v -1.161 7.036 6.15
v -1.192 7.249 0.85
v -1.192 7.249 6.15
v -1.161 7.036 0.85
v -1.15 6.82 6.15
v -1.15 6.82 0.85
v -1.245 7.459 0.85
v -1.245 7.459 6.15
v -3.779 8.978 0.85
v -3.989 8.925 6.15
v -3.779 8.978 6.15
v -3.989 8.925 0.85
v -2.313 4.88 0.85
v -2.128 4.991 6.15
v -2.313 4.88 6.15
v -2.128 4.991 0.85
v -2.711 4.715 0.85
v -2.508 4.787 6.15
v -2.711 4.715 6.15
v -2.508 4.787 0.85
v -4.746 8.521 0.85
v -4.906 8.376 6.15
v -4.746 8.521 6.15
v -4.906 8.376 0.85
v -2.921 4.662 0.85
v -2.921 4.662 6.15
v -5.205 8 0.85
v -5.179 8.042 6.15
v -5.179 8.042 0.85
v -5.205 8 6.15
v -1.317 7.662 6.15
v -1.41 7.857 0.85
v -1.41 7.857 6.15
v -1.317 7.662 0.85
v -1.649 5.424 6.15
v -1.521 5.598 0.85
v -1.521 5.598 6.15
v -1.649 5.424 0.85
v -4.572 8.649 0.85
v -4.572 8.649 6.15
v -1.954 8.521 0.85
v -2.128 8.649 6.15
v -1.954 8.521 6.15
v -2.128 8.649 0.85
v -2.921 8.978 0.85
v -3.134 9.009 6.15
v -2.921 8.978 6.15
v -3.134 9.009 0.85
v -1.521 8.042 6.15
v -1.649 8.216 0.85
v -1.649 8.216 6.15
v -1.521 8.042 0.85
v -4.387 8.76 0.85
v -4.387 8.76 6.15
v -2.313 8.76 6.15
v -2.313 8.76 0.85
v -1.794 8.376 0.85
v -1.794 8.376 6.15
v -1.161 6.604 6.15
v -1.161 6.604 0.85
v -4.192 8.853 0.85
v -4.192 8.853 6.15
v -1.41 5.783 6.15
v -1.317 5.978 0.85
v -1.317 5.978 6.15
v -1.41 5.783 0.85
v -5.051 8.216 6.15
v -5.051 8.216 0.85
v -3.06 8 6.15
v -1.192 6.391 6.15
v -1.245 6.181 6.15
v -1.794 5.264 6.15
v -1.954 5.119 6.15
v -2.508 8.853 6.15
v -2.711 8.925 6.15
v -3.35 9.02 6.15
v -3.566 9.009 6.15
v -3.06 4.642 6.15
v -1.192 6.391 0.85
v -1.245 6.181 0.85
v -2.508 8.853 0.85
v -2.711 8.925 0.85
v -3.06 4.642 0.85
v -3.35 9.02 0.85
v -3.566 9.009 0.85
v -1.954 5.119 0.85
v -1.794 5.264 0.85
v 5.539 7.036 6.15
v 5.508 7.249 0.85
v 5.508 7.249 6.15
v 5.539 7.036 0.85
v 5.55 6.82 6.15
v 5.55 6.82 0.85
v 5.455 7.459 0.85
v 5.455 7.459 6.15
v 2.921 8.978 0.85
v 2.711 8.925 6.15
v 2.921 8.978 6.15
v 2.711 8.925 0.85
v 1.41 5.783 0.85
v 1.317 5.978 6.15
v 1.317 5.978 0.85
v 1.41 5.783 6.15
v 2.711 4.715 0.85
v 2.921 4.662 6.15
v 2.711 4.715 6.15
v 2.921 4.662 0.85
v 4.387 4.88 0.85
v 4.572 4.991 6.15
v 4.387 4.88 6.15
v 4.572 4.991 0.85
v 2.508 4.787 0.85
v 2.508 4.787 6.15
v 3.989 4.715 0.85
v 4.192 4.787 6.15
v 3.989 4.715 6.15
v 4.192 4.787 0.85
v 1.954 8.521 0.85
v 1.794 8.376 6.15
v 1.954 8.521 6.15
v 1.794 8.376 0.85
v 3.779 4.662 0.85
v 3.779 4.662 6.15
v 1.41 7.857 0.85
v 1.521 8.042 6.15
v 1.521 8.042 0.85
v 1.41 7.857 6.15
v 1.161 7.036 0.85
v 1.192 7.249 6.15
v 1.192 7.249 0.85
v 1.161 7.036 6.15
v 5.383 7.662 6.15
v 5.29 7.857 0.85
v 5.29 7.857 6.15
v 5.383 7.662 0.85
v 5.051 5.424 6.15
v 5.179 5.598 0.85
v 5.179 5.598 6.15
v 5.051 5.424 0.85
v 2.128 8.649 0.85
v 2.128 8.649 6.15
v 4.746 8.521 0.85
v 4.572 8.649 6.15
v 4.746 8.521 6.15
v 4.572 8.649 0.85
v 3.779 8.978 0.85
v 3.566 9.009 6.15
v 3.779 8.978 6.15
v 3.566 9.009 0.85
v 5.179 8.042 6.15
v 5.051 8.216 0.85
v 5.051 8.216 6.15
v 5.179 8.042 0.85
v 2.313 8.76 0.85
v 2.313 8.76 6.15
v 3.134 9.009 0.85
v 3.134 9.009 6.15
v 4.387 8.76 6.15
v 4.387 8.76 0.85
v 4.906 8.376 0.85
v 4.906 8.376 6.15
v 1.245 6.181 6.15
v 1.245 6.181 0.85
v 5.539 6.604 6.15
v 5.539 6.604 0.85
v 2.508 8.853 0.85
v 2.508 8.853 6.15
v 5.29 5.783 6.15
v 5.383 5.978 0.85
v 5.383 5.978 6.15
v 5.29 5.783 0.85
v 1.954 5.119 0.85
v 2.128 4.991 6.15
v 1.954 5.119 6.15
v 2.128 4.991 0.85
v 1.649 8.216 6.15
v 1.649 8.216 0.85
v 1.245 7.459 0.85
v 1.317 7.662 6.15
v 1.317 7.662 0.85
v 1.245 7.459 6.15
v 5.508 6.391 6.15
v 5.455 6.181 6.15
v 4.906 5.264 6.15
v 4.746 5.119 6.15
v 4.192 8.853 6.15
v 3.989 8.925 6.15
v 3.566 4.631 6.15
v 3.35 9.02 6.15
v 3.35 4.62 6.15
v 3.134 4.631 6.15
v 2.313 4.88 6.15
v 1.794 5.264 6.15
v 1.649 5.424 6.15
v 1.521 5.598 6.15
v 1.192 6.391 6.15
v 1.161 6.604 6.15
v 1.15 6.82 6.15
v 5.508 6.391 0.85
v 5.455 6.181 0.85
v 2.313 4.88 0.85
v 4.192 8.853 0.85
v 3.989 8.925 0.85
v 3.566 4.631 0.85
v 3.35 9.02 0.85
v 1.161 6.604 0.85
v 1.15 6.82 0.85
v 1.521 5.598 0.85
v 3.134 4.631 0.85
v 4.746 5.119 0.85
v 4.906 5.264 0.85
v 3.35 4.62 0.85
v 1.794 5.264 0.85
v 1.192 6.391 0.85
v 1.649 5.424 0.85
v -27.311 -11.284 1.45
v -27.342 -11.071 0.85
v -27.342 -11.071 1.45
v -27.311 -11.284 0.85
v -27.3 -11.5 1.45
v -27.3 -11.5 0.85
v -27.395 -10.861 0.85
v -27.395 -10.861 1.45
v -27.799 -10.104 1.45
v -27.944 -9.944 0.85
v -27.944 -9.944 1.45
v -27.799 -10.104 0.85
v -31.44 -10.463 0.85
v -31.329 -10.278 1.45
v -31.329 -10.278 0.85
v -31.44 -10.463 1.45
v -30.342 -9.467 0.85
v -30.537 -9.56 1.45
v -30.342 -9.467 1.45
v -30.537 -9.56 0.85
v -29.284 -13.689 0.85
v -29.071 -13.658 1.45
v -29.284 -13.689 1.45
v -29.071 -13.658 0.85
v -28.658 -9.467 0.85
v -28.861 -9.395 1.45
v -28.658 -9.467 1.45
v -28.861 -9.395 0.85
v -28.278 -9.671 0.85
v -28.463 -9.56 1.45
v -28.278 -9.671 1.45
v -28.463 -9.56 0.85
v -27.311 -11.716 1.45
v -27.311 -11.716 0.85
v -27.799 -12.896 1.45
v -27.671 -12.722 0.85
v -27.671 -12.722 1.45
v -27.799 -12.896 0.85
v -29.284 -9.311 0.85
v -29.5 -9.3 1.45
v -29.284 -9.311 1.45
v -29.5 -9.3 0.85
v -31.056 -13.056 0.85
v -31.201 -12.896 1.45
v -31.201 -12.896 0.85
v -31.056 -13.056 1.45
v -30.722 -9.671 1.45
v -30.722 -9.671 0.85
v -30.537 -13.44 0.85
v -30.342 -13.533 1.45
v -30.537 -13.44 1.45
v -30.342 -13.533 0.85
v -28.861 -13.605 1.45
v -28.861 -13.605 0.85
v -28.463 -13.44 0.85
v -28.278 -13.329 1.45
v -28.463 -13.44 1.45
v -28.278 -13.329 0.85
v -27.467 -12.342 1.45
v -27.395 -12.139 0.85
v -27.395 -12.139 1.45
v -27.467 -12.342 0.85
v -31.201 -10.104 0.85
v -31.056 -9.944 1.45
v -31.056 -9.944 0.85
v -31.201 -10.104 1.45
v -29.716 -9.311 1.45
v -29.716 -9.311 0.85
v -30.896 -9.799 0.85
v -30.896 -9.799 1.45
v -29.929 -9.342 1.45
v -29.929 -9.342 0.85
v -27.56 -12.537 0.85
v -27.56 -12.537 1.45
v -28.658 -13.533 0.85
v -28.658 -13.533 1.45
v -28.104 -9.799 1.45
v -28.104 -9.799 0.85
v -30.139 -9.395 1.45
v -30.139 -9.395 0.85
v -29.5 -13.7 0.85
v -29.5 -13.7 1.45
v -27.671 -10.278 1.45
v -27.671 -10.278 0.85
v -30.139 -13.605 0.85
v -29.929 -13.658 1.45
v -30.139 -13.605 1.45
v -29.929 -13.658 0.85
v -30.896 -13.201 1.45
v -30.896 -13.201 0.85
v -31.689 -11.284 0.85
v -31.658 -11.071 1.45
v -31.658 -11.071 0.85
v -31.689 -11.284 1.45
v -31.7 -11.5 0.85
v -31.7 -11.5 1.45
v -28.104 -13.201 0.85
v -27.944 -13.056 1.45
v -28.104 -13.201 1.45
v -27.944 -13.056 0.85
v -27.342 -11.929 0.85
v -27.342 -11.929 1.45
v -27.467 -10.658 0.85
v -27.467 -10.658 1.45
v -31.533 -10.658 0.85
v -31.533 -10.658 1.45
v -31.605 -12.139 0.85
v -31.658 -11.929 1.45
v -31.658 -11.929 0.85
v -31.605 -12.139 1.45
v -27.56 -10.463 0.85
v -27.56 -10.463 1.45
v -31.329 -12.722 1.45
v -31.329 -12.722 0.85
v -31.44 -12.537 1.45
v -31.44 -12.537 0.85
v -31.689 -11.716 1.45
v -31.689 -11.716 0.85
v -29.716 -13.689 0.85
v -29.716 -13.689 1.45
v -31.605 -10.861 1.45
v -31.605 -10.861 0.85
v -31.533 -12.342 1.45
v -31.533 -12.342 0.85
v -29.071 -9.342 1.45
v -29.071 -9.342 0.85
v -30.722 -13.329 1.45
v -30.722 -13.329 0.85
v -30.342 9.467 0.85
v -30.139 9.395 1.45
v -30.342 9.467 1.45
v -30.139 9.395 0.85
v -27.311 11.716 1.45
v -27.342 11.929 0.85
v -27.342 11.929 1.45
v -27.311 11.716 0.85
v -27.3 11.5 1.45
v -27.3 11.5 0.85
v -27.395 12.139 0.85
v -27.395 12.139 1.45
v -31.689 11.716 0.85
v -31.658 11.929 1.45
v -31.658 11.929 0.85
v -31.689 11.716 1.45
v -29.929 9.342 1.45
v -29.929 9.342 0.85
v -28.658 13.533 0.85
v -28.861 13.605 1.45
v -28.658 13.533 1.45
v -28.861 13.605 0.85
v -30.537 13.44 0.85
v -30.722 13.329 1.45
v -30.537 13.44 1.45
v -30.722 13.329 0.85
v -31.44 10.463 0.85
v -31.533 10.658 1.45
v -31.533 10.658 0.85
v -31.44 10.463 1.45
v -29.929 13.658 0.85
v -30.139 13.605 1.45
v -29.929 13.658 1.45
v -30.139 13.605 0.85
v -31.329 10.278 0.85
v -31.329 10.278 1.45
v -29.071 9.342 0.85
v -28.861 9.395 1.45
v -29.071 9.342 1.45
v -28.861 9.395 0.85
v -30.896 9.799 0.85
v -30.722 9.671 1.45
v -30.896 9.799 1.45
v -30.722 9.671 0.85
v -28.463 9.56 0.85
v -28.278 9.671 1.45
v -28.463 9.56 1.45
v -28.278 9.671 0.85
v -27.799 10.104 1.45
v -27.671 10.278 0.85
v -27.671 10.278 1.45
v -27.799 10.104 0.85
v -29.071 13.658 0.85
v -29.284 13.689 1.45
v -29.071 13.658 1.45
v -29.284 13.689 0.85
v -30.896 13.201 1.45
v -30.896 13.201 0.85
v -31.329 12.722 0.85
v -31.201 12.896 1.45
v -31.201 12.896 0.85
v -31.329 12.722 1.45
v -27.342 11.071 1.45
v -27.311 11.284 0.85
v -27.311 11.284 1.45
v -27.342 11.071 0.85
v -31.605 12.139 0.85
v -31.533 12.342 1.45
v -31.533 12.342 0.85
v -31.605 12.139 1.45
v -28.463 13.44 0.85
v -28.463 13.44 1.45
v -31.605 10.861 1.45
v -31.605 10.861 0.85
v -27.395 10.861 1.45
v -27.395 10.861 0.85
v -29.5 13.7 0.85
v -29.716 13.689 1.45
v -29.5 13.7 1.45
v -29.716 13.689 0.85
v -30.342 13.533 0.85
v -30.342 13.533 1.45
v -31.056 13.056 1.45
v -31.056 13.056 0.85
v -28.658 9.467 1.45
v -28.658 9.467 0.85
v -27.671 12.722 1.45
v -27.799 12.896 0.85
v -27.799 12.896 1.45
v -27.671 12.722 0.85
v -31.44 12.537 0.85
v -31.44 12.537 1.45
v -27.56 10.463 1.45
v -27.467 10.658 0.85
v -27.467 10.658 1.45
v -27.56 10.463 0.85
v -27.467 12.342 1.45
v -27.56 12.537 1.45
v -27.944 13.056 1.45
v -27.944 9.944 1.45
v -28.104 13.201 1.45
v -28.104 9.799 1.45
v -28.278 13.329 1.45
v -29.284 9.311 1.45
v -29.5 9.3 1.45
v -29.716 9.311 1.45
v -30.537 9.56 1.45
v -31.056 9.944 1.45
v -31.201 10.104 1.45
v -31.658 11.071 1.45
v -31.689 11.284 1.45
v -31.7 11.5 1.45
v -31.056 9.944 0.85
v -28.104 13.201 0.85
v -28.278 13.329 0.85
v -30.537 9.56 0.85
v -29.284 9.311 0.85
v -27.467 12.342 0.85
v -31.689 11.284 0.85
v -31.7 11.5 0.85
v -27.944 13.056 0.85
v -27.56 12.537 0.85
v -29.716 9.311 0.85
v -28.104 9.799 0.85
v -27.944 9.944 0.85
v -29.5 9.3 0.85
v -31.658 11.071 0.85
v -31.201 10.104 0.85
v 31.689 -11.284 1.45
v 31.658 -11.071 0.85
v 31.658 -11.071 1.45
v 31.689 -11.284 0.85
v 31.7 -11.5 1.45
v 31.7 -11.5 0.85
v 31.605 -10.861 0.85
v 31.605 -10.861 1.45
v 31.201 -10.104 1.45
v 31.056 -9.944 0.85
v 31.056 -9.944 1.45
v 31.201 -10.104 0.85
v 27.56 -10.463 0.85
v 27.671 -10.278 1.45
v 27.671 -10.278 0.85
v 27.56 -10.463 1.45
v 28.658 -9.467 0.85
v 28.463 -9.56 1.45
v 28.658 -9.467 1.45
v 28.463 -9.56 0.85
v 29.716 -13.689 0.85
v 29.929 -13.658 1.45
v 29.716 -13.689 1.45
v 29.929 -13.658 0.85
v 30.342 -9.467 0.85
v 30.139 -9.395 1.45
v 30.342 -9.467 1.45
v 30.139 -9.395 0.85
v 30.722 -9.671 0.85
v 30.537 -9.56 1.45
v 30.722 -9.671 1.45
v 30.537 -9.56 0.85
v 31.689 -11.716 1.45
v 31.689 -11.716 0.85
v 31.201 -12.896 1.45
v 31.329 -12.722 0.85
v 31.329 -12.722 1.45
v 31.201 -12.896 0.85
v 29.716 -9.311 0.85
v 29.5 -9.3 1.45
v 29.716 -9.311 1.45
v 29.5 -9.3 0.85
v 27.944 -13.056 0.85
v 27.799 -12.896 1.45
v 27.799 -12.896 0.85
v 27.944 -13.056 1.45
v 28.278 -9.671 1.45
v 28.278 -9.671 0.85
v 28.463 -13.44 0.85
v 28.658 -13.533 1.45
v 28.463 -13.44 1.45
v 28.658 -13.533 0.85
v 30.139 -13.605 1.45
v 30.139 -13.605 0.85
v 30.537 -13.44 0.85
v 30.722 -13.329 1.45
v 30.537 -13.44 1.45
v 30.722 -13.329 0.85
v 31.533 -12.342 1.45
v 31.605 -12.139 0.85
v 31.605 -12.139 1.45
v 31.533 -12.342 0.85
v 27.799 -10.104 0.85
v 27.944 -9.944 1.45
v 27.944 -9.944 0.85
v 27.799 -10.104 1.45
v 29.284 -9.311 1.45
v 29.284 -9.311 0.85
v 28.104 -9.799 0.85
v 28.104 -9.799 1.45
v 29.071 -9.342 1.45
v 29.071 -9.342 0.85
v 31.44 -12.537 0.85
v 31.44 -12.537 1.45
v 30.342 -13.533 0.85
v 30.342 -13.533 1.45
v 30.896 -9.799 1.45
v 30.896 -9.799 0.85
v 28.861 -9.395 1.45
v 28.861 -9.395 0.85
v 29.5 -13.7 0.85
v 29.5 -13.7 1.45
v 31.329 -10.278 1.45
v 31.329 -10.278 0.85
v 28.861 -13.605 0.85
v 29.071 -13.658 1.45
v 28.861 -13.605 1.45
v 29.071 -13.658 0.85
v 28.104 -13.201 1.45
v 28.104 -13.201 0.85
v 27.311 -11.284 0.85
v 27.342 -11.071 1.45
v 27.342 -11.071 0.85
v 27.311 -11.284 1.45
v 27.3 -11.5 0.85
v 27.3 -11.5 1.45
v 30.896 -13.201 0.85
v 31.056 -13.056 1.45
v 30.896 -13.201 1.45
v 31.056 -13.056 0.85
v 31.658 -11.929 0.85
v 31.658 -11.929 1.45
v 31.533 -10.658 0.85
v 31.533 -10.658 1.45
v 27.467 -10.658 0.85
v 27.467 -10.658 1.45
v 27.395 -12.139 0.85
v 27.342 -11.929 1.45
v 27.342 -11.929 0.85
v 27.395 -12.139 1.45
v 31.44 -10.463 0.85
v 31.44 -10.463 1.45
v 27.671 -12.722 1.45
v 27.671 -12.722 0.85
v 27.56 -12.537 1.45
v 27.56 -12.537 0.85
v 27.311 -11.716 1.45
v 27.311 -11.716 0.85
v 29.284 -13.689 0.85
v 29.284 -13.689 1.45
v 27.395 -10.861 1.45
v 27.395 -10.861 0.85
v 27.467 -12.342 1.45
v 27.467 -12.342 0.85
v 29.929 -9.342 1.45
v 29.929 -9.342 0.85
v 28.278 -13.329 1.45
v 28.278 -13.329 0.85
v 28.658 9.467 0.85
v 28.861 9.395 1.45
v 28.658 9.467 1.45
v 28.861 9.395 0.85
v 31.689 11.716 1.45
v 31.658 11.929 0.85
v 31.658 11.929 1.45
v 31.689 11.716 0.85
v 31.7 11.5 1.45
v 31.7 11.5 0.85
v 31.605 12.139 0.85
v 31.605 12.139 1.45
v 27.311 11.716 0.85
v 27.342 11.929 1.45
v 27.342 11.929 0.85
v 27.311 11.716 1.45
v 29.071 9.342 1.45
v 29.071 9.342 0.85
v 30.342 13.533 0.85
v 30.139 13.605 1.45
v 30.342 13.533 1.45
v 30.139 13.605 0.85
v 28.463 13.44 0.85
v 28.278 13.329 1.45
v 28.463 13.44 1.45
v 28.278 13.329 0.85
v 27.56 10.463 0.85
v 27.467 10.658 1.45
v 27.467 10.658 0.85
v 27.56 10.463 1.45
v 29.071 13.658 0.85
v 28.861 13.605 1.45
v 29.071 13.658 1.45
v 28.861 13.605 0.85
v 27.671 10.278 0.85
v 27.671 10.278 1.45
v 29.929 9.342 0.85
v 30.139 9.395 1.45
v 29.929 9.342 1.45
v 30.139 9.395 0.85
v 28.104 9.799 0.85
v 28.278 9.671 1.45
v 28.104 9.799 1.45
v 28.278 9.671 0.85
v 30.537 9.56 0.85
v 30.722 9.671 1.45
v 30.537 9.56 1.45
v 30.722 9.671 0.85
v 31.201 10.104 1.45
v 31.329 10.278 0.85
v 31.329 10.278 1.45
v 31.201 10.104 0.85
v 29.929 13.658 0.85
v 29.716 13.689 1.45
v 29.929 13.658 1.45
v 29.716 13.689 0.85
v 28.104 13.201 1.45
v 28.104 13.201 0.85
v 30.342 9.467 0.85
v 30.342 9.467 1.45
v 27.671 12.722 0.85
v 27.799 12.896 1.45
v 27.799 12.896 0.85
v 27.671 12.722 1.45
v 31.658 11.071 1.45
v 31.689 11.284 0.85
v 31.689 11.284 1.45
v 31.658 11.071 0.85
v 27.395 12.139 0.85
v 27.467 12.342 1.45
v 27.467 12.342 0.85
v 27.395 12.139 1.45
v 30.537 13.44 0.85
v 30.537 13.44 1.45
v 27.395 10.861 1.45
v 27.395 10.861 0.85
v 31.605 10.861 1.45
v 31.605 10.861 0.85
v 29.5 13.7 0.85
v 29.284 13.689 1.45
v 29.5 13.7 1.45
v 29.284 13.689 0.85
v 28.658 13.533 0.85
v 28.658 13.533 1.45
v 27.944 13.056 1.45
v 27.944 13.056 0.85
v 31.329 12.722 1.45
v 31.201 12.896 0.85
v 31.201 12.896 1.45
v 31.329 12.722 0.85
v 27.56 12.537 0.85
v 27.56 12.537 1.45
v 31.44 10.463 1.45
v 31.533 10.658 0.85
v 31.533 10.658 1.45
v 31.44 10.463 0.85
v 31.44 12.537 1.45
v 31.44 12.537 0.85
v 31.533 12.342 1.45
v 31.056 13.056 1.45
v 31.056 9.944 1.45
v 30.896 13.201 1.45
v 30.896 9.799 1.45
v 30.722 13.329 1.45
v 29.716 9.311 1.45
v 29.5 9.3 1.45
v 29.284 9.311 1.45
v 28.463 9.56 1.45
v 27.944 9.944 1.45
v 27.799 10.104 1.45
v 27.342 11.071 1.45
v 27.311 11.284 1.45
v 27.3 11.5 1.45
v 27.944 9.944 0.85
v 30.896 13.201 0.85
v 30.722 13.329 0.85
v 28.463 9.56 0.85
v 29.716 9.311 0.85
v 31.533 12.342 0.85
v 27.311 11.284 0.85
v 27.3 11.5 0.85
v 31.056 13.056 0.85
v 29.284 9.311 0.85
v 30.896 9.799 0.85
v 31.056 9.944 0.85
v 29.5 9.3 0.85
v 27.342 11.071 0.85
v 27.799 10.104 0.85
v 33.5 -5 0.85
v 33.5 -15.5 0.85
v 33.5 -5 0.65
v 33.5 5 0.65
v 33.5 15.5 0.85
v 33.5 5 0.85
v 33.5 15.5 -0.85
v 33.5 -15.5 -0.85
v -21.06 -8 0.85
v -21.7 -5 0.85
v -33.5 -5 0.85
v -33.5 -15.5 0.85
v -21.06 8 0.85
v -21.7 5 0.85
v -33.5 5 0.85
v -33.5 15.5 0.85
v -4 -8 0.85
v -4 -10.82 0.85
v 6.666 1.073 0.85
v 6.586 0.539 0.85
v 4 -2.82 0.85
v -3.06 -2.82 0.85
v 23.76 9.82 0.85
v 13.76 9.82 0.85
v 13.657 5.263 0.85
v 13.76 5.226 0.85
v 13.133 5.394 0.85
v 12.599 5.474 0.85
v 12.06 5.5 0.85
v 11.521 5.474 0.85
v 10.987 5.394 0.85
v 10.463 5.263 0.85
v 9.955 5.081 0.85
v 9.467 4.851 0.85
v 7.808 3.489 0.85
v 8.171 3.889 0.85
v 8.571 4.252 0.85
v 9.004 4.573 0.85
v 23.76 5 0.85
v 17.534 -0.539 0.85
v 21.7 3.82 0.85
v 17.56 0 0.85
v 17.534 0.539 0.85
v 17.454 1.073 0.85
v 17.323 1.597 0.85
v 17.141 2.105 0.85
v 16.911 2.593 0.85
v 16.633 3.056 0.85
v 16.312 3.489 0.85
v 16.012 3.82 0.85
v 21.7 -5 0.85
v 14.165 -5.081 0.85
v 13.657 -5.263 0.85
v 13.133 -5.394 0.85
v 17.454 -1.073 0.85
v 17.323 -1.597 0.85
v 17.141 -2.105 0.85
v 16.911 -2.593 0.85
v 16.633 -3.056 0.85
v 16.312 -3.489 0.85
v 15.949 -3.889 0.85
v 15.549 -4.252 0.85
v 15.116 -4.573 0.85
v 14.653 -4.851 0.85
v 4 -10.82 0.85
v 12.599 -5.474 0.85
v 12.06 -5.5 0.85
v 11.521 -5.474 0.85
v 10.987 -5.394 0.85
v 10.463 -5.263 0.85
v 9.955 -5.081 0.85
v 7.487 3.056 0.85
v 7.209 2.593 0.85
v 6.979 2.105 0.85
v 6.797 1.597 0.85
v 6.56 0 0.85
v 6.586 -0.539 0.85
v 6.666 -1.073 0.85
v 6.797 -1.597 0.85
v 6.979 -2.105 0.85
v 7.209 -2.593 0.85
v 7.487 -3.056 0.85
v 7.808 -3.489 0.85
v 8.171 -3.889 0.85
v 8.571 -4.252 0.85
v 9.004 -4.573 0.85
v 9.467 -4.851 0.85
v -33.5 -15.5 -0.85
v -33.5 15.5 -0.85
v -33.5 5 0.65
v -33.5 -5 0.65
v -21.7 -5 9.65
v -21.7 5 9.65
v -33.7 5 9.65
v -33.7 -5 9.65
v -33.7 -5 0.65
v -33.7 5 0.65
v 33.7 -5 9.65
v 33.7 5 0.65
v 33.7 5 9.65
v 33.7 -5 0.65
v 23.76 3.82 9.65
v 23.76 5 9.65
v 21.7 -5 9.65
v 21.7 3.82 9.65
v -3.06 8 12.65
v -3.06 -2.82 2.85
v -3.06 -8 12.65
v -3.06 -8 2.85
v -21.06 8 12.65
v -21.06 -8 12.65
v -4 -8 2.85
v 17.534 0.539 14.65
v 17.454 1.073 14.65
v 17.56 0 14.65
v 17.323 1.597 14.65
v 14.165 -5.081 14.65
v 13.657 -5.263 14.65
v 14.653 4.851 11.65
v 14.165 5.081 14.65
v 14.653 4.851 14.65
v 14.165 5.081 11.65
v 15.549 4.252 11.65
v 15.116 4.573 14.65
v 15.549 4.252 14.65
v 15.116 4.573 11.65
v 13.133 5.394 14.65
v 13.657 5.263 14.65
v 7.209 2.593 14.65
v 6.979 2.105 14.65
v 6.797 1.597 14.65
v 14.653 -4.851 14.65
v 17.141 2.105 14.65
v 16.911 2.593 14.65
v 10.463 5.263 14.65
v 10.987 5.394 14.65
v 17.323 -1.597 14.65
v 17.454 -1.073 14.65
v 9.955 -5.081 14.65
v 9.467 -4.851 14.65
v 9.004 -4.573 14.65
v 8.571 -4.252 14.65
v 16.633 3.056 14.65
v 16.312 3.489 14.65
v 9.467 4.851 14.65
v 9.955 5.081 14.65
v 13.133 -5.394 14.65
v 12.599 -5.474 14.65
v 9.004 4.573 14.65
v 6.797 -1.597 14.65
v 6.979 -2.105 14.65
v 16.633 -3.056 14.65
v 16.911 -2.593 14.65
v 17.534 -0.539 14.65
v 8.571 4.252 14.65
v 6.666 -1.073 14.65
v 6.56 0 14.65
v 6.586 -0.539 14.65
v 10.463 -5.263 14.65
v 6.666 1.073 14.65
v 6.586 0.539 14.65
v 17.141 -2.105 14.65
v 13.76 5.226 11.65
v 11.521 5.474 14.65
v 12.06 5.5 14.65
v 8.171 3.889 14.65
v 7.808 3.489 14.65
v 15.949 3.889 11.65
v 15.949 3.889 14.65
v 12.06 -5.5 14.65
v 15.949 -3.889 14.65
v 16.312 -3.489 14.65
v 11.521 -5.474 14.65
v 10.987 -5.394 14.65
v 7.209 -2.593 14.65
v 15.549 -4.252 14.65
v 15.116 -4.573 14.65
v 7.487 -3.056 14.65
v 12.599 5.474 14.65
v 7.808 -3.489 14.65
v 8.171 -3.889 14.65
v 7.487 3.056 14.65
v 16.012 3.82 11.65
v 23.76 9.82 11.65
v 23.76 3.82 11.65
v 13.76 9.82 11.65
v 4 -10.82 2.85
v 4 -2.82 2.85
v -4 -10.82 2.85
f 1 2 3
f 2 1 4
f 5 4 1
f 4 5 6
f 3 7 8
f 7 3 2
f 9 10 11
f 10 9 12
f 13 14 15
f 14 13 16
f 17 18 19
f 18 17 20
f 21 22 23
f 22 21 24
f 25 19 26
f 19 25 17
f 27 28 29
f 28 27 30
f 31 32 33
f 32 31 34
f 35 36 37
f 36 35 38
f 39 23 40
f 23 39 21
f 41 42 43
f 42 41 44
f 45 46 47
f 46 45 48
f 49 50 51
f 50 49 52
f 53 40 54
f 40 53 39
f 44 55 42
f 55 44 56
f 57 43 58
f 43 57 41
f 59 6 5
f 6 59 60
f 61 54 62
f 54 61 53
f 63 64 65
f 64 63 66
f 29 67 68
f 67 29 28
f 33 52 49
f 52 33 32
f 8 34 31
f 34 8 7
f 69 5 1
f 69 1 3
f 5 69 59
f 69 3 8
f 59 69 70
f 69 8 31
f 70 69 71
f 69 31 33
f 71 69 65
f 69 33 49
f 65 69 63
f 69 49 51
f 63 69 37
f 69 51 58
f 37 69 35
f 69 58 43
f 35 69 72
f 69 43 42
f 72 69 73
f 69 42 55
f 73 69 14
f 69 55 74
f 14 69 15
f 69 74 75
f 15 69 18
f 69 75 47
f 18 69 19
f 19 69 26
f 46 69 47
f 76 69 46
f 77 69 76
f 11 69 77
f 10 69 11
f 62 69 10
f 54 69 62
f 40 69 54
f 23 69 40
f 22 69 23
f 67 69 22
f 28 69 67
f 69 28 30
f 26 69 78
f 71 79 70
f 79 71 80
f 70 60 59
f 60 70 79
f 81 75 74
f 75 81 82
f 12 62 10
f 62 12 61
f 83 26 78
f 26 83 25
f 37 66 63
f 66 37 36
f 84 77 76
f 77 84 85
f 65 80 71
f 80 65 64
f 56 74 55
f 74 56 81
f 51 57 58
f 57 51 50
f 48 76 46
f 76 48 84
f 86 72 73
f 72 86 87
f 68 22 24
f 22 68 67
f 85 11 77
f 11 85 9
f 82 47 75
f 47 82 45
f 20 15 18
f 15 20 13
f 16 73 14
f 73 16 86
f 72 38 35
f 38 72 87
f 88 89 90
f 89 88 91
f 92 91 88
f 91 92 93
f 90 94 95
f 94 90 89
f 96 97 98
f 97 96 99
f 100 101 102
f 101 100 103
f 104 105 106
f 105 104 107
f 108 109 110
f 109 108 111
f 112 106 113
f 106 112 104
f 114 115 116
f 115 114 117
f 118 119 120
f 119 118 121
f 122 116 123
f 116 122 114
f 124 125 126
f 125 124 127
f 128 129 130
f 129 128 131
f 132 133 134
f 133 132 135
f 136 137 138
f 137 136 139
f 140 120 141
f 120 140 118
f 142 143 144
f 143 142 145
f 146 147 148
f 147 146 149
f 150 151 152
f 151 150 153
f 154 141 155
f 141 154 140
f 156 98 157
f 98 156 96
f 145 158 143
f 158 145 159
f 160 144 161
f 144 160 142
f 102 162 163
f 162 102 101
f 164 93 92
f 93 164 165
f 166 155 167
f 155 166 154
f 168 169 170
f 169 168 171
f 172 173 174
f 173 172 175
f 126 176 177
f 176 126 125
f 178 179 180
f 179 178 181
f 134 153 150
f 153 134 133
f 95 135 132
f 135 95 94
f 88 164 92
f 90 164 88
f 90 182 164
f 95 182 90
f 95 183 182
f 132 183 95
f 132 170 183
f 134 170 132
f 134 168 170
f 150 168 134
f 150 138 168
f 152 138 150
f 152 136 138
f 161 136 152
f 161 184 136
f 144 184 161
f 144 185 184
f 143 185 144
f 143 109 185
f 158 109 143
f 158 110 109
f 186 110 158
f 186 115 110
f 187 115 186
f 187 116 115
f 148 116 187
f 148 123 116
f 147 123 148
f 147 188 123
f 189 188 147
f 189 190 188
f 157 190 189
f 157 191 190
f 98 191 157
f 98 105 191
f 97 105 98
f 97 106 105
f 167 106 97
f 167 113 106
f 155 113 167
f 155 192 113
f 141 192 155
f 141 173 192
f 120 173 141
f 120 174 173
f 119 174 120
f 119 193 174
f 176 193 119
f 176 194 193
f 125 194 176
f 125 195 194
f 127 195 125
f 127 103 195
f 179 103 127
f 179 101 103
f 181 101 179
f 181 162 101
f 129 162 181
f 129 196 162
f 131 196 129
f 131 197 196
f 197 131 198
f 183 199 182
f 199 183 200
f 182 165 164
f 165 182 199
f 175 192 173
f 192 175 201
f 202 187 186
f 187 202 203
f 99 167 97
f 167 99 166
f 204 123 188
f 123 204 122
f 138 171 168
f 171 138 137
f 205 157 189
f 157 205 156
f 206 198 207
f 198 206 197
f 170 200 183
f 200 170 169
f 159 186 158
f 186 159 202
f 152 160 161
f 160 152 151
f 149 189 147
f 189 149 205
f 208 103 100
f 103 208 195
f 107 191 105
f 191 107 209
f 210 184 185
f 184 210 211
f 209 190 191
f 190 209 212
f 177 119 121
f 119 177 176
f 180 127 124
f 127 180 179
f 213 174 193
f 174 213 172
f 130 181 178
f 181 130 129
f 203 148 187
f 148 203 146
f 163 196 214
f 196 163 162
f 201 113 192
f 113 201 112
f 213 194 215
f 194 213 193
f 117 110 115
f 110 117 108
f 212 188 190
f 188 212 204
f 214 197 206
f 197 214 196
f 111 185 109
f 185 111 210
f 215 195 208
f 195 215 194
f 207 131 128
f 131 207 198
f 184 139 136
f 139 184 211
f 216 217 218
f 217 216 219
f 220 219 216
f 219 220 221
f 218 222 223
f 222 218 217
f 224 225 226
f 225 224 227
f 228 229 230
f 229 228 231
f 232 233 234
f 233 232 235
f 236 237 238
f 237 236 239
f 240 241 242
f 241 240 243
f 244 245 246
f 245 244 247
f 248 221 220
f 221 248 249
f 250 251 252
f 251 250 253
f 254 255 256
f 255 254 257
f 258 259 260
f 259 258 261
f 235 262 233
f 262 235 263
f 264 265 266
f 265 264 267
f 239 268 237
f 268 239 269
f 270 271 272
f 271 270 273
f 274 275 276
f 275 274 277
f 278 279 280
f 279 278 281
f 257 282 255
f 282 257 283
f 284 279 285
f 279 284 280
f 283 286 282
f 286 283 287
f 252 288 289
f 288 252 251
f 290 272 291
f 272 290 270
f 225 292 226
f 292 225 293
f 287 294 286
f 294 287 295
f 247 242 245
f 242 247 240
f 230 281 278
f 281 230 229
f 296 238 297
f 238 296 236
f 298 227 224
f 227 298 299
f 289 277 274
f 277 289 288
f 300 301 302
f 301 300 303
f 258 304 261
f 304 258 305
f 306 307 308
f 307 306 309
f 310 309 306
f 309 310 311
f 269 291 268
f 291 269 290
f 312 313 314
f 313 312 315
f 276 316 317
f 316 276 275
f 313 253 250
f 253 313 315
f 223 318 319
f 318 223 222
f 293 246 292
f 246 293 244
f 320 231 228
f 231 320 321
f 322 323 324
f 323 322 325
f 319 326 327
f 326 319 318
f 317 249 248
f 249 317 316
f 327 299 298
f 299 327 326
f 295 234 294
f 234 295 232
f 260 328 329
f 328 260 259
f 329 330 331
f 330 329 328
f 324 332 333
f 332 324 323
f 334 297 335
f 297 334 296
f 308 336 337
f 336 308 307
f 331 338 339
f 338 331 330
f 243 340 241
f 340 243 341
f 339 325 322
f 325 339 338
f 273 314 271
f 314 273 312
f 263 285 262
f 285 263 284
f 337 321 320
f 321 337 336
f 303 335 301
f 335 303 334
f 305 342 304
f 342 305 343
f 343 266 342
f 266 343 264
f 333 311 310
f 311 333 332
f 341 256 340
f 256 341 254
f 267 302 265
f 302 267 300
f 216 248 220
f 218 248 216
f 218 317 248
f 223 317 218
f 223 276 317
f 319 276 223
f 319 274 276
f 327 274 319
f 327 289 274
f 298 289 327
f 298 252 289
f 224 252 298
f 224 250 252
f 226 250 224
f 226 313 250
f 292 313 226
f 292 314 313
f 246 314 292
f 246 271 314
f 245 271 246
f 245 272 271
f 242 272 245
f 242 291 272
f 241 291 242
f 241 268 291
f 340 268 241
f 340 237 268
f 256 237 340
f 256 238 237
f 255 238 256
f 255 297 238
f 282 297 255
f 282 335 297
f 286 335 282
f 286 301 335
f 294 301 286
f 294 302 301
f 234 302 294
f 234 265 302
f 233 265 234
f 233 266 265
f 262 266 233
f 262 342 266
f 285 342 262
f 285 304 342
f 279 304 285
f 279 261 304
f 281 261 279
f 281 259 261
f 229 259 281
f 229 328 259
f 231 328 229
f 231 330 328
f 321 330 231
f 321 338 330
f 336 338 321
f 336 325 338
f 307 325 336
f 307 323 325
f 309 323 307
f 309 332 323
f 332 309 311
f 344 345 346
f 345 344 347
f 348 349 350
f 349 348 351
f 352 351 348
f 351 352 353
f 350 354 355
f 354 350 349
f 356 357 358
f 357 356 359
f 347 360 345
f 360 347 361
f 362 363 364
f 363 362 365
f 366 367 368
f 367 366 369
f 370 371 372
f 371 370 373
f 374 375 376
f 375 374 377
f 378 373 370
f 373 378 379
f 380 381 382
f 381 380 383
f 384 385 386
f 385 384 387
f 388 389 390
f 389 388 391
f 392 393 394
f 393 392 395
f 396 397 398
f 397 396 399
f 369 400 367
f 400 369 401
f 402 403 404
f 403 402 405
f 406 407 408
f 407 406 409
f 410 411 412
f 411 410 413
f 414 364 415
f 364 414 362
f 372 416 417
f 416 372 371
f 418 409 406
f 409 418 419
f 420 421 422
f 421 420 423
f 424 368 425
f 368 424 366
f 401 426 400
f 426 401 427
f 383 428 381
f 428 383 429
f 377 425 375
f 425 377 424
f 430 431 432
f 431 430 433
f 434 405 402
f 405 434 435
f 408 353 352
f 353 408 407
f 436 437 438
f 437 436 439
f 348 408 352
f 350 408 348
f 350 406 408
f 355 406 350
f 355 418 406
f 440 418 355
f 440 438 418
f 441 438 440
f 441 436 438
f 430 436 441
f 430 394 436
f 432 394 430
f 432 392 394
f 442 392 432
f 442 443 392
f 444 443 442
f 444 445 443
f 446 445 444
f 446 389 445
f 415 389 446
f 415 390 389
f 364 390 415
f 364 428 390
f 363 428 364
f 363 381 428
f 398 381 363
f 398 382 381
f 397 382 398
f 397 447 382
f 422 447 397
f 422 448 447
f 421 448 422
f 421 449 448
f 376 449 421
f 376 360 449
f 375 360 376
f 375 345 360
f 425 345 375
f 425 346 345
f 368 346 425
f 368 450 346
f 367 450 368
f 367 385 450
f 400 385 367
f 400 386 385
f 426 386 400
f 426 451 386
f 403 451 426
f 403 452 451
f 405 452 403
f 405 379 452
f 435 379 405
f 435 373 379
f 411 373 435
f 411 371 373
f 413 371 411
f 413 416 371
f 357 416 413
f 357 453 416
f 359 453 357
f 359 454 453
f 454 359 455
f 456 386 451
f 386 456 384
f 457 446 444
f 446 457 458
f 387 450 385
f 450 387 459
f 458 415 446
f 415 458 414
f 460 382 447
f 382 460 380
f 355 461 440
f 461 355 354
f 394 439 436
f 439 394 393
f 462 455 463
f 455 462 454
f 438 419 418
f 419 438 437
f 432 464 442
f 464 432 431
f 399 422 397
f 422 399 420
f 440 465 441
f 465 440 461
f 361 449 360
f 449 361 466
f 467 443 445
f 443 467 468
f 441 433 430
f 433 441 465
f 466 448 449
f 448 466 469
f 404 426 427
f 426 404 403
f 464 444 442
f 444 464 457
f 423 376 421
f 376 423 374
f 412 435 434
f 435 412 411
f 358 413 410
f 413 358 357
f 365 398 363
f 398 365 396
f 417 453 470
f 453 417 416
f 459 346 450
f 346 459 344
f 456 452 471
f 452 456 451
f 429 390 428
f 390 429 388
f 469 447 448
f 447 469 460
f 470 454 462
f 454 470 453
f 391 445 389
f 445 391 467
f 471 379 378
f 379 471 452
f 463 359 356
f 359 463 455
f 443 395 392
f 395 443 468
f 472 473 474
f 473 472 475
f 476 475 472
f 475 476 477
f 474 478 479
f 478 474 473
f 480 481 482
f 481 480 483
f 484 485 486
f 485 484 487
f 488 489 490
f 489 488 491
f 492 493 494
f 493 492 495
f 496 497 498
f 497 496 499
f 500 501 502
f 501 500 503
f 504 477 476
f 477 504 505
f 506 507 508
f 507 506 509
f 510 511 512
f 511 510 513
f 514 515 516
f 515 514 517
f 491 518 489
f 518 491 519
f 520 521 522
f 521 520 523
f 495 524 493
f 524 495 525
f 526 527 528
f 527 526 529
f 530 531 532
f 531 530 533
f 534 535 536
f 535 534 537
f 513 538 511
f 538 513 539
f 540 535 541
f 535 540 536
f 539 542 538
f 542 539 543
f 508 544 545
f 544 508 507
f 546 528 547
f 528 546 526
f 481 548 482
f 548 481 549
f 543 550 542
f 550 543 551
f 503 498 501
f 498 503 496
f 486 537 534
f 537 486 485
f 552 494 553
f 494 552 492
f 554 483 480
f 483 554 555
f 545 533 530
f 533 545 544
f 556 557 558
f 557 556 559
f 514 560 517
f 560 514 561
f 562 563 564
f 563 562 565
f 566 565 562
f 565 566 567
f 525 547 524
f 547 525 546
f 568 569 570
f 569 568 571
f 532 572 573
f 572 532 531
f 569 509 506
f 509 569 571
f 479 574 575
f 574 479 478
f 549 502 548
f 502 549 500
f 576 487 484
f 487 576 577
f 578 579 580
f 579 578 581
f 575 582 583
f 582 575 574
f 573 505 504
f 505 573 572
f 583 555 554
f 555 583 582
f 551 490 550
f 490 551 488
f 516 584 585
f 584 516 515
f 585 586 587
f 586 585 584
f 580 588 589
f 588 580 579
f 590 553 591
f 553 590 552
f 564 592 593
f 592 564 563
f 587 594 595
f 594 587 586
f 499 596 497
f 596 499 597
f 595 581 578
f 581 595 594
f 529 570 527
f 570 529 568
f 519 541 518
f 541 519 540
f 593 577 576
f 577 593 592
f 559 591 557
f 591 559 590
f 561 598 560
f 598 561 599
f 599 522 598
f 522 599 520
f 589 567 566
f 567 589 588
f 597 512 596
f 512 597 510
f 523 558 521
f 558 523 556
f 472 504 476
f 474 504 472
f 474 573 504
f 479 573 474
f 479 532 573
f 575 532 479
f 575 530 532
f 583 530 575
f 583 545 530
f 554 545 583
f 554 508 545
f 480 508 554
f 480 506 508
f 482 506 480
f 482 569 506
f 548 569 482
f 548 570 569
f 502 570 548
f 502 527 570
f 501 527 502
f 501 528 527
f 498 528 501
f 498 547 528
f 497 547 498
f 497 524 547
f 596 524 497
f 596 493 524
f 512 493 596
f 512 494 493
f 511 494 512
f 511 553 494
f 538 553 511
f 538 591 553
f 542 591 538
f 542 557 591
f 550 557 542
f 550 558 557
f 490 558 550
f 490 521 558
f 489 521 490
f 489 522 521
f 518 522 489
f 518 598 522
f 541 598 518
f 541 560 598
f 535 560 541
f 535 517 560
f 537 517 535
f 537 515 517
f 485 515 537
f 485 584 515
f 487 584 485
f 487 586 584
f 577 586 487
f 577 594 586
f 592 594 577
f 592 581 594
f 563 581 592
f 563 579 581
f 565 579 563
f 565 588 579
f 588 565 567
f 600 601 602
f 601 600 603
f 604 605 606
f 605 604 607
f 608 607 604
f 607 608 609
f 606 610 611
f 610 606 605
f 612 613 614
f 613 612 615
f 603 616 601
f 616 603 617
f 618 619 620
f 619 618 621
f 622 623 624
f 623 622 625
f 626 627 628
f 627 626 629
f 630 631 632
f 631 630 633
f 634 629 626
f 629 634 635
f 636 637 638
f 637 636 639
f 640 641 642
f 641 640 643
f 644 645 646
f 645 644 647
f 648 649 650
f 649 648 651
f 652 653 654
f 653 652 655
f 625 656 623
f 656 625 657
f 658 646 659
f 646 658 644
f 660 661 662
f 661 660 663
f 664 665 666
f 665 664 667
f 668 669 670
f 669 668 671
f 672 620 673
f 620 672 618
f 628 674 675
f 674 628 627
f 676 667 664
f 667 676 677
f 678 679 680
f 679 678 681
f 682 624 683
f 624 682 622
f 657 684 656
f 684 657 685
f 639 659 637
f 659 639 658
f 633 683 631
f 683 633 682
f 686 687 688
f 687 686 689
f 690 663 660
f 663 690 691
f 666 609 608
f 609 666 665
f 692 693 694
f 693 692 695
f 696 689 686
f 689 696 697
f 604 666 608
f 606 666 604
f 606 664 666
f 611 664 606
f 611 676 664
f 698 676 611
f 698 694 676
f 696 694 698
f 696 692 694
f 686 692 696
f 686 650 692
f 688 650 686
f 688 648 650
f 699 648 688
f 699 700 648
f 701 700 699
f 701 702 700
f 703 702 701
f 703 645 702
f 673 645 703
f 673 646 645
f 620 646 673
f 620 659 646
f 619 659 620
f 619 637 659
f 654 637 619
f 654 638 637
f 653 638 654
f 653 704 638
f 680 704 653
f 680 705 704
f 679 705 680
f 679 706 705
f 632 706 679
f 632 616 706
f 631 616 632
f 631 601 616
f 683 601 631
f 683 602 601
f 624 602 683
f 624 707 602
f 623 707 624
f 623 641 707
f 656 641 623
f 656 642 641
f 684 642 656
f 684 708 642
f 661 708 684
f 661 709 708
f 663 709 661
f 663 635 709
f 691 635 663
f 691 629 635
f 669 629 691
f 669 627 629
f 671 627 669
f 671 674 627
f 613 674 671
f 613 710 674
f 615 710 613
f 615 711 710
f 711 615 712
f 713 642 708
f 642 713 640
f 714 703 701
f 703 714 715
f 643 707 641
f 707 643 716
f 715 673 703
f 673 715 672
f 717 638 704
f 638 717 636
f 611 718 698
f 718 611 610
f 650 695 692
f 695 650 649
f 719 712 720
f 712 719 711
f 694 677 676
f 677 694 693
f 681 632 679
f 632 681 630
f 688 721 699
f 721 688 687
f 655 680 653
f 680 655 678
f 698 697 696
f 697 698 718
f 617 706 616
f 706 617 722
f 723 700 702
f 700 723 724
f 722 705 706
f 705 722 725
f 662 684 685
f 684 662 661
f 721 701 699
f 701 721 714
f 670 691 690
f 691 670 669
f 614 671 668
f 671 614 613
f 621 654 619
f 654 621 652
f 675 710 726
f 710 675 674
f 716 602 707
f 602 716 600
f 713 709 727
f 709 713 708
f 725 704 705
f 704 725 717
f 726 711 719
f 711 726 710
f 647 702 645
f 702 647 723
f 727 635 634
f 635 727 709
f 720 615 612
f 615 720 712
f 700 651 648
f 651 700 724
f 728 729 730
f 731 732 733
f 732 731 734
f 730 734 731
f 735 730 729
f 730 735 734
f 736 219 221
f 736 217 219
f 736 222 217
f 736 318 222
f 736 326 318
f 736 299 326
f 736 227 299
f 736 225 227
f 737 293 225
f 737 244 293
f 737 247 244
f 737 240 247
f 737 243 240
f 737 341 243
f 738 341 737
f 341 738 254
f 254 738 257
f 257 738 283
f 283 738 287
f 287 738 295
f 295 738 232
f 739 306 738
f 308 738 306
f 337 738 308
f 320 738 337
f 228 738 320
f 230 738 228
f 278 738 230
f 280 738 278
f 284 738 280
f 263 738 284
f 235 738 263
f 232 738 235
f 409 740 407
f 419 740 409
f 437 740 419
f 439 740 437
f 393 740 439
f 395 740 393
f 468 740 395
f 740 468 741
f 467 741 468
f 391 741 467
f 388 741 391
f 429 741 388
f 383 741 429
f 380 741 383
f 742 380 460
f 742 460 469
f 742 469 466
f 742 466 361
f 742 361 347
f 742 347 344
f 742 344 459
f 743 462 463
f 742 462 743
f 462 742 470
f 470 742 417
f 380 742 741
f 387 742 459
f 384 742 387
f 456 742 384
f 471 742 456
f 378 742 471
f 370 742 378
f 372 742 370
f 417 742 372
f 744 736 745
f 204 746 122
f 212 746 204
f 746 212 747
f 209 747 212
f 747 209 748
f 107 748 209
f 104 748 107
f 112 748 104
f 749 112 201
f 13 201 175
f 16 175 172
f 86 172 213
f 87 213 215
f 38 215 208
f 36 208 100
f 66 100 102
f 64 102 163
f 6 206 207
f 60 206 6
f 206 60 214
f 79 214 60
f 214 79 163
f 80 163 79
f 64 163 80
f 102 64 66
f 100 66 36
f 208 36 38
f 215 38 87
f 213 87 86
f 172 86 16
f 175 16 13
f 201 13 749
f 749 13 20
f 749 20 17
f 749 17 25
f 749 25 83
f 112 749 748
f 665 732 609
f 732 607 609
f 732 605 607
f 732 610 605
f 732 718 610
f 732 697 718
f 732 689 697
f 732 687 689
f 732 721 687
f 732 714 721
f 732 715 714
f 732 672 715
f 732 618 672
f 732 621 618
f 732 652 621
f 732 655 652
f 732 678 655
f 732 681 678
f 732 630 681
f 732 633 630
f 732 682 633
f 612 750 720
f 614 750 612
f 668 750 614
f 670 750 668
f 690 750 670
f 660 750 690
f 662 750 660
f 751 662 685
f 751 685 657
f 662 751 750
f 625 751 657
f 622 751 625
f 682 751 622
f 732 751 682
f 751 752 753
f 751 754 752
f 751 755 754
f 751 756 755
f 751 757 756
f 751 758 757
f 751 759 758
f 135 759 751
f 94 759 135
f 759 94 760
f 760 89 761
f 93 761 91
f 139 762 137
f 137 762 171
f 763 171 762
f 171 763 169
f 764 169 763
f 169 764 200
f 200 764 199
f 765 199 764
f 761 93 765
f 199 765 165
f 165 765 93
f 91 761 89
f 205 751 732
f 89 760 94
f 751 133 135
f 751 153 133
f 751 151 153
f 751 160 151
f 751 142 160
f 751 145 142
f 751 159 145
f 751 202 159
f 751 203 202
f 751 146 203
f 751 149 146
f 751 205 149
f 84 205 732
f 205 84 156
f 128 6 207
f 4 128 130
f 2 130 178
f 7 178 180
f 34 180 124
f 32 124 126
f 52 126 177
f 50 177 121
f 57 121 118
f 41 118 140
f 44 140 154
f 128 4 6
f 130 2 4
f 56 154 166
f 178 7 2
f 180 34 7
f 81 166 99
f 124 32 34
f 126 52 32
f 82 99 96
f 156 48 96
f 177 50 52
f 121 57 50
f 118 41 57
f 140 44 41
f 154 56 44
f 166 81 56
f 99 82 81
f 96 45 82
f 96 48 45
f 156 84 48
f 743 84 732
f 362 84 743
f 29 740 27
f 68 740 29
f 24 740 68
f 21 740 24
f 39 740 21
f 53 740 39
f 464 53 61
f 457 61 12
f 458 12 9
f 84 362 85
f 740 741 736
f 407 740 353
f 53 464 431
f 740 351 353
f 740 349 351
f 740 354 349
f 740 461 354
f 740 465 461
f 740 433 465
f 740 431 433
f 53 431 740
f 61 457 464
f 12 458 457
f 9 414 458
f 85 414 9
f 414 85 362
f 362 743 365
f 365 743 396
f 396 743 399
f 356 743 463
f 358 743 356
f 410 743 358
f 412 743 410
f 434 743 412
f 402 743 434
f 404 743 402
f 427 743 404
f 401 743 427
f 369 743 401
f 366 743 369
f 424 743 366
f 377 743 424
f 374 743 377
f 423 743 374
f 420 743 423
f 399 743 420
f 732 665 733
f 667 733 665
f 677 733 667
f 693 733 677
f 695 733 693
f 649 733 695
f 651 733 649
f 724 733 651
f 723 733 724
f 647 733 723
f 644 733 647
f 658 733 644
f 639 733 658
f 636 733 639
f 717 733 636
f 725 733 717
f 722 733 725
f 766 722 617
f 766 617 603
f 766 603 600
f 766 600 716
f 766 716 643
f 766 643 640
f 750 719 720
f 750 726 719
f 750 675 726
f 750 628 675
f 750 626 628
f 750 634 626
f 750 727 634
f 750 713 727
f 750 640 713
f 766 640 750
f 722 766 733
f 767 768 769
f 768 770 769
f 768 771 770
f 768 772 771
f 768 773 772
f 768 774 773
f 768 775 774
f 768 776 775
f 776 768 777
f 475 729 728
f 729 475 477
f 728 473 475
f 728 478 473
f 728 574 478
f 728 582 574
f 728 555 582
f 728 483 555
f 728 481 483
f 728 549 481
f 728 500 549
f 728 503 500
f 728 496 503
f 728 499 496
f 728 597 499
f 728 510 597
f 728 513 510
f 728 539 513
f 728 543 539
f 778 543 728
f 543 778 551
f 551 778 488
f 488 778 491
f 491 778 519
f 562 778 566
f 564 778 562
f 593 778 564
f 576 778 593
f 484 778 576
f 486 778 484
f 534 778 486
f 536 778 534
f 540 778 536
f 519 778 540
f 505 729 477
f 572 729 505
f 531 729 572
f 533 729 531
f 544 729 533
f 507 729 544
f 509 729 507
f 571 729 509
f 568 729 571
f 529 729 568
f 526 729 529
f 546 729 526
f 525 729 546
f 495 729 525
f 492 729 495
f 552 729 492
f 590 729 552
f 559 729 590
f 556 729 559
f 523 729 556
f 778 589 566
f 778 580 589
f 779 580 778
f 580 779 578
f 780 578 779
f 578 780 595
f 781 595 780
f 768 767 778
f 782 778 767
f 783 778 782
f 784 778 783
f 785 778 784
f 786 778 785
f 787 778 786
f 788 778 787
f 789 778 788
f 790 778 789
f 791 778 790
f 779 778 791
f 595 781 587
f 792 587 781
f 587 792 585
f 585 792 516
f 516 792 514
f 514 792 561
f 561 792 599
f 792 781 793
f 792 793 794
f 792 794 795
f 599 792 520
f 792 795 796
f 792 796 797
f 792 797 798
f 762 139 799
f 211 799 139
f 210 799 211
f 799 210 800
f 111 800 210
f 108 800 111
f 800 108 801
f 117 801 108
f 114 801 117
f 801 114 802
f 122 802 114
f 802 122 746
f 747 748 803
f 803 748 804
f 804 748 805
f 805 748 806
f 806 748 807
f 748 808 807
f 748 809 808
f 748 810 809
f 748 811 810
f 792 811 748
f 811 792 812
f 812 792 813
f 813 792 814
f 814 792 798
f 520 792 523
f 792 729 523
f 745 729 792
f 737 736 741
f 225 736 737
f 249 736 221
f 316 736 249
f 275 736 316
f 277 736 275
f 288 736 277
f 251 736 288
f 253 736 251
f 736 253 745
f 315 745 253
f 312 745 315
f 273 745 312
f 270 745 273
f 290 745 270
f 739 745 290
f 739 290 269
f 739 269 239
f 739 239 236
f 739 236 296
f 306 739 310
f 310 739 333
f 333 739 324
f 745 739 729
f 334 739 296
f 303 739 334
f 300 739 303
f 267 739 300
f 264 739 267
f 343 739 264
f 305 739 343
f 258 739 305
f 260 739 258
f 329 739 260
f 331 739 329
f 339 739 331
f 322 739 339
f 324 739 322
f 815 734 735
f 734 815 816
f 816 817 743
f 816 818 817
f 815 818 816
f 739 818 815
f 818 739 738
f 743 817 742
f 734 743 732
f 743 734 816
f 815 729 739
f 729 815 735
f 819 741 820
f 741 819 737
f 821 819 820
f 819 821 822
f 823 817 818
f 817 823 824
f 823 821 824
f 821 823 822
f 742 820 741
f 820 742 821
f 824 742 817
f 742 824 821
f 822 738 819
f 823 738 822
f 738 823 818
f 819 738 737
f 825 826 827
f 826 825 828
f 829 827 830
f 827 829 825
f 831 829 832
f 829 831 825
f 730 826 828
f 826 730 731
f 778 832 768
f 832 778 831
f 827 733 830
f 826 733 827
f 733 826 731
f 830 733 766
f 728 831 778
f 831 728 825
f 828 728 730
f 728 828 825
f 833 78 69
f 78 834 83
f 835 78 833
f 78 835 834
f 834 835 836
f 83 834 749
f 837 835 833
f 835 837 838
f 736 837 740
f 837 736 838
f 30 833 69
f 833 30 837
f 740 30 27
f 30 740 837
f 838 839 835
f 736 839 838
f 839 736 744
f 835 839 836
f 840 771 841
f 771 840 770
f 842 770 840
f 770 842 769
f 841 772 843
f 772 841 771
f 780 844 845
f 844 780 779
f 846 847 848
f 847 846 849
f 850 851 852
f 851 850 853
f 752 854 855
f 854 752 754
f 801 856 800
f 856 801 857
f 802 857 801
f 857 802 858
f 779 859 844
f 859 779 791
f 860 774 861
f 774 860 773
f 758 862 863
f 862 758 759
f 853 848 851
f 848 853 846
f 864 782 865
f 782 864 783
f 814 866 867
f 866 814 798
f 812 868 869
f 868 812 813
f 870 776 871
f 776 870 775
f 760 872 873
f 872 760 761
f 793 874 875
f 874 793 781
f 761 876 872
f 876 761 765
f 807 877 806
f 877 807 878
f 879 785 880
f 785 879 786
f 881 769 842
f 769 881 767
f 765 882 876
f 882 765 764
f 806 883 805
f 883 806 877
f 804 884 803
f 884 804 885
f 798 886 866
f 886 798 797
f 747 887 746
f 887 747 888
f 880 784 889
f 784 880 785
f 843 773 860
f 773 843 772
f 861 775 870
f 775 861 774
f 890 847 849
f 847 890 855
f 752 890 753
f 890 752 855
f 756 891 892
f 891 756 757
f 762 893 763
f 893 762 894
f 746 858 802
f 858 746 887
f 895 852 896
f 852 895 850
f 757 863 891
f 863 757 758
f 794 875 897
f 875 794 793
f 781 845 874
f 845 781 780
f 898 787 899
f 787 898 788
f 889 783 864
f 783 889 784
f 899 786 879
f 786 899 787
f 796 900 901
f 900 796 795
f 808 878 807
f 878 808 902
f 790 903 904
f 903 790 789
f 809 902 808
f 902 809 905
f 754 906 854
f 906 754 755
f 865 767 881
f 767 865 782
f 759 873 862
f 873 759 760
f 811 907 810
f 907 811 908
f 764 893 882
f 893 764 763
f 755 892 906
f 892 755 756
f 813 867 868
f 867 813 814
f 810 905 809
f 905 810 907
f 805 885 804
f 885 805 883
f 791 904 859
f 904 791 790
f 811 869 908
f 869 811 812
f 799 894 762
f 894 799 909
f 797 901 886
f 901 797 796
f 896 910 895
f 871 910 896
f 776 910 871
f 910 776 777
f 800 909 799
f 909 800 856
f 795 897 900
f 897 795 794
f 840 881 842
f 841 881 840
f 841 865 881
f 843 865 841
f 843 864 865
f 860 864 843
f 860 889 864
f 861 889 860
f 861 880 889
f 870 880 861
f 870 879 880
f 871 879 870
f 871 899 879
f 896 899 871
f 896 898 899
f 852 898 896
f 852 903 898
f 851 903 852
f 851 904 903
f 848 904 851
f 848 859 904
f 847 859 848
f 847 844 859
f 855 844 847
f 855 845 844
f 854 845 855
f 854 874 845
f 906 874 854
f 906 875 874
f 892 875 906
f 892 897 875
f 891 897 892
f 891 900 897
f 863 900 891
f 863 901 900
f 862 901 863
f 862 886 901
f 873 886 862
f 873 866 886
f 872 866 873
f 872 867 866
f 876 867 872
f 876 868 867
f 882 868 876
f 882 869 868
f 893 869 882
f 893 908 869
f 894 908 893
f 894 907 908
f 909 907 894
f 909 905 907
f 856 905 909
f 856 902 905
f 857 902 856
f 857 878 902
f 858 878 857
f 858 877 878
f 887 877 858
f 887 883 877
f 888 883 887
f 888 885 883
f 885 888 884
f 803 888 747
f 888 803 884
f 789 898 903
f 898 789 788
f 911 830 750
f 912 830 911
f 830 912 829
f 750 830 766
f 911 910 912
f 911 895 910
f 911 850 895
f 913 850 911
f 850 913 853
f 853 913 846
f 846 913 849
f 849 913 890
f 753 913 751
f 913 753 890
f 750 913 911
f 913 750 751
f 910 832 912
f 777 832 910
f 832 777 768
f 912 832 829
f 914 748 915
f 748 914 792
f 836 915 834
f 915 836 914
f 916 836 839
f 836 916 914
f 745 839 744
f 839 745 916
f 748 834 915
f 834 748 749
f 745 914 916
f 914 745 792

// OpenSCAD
$fn = 64;

// Power supply board overall size (verified by parameters)
board_x = 67.0;
board_y = 31.0;
board_th = 1.7;

eps = 0.2; // small overlap to guarantee one connected solid

module pcb_board() {
    // Centered board for easy, formula-based placement
    color([0.05, 0.45, 0.15])
        cube([board_x, board_y, board_th], center=true);
}

module feature_block(size_xyz, pos_xyz, col=[0.2,0.2,0.2]) {
    // pos_xyz is the CENTER position of the block
    color(col)
        translate(pos_xyz)
            cube(size_xyz, center=true);
}

module feature_cyl(r, h, pos_xyz, col=[0.25,0.25,0.25]) {
    color(col)
        translate(pos_xyz)
            cylinder(r=r, h=h, center=true);
}

union() {
    // PCB
    pcb_board();

    // Common Z placement: sit on top of PCB with slight overlap
    // Any component with height h uses: z = board_th/2 + h/2 - eps
    // This ensures connectivity (no floating parts).

    // AC input terminal block (left edge)
    term_w = 12;
    term_d = 10;
    term_h = 9;
    feature_block(
        [term_w, term_d, term_h],
        [
            -board_x/2 + term_w/2 - eps,
            0,
            board_th/2 + term_h/2 - eps
        ],
        [0.15, 0.15, 0.15]
    );

    // DC output terminal block (right edge)
    out_w = 12;
    out_d = 10;
    out_h = 9;
    feature_block(
        [out_w, out_d, out_h],
        [
            board_x/2 - out_w/2 + eps,
            0,
            board_th/2 + out_h/2 - eps
        ],
        [0.15, 0.15, 0.15]
    );

    // Large transformer/inductor block (center-left)
    mag_w = 18;
    mag_d = 16;
    mag_h = 12;
    feature_block(
        [mag_w, mag_d, mag_h],
        [
            -board_x*0.18,
            0,
            board_th/2 + mag_h/2 - eps
        ],
        [0.10, 0.10, 0.10]
    );

    // Electrolytic capacitor (center-right)
    cap_r = 5.5;
    cap_h = 14;
    feature_cyl(
        cap_r, cap_h,
        [
            board_x*0.18,
            0,
            board_th/2 + cap_h/2 - eps
        ],
        [0.08, 0.08, 0.08]
    );

    // Small heatsink block (upper side, near right)
    hs_w = 10;
    hs_d = 6;
    hs_h = 11;
    feature_block(
        [hs_w, hs_d, hs_h],
        [
            board_x*0.28,
            board_y*0.22,
            board_th/2 + hs_h/2 - eps
        ],
        [0.18, 0.18, 0.18]
    );

    // Controller IC block (lower side, near center)
    ic_w = 8;
    ic_d = 8;
    ic_h = 2.2;
    feature_block(
        [ic_w, ic_d, ic_h],
        [
            0,
            -board_y*0.22,
            board_th/2 + ic_h/2 - eps
        ],
        [0.05, 0.05, 0.05]
    );

    // Two small capacitors (top side)
    sc_r = 2.2;
    sc_h = 5.5;
    for (sx = [-1, 1]) {
        feature_cyl(
            sc_r, sc_h,
            [
                sx * board_x*0.05,
                board_y*0.22,
                board_th/2 + sc_h/2 - eps
            ],
            [0.10, 0.10, 0.10]
        );
    }

    // Mounting hole pads as shallow bosses (still connected solid)
    pad_r = 2.2;
    pad_h = 0.8;
    hole_inset_x = 4.0;
    hole_inset_y = 4.0;
    for (ix = [-1, 1])
    for (iy = [-1, 1]) {
        feature_cyl(
            pad_r, pad_h,
            [
                ix*(board_x/2 - hole_inset_x),
                iy*(board_y/2 - hole_inset_y),
                board_th/2 + pad_h/2 - eps
            ],
            [0.75, 0.65, 0.10]
        );
    }
}
